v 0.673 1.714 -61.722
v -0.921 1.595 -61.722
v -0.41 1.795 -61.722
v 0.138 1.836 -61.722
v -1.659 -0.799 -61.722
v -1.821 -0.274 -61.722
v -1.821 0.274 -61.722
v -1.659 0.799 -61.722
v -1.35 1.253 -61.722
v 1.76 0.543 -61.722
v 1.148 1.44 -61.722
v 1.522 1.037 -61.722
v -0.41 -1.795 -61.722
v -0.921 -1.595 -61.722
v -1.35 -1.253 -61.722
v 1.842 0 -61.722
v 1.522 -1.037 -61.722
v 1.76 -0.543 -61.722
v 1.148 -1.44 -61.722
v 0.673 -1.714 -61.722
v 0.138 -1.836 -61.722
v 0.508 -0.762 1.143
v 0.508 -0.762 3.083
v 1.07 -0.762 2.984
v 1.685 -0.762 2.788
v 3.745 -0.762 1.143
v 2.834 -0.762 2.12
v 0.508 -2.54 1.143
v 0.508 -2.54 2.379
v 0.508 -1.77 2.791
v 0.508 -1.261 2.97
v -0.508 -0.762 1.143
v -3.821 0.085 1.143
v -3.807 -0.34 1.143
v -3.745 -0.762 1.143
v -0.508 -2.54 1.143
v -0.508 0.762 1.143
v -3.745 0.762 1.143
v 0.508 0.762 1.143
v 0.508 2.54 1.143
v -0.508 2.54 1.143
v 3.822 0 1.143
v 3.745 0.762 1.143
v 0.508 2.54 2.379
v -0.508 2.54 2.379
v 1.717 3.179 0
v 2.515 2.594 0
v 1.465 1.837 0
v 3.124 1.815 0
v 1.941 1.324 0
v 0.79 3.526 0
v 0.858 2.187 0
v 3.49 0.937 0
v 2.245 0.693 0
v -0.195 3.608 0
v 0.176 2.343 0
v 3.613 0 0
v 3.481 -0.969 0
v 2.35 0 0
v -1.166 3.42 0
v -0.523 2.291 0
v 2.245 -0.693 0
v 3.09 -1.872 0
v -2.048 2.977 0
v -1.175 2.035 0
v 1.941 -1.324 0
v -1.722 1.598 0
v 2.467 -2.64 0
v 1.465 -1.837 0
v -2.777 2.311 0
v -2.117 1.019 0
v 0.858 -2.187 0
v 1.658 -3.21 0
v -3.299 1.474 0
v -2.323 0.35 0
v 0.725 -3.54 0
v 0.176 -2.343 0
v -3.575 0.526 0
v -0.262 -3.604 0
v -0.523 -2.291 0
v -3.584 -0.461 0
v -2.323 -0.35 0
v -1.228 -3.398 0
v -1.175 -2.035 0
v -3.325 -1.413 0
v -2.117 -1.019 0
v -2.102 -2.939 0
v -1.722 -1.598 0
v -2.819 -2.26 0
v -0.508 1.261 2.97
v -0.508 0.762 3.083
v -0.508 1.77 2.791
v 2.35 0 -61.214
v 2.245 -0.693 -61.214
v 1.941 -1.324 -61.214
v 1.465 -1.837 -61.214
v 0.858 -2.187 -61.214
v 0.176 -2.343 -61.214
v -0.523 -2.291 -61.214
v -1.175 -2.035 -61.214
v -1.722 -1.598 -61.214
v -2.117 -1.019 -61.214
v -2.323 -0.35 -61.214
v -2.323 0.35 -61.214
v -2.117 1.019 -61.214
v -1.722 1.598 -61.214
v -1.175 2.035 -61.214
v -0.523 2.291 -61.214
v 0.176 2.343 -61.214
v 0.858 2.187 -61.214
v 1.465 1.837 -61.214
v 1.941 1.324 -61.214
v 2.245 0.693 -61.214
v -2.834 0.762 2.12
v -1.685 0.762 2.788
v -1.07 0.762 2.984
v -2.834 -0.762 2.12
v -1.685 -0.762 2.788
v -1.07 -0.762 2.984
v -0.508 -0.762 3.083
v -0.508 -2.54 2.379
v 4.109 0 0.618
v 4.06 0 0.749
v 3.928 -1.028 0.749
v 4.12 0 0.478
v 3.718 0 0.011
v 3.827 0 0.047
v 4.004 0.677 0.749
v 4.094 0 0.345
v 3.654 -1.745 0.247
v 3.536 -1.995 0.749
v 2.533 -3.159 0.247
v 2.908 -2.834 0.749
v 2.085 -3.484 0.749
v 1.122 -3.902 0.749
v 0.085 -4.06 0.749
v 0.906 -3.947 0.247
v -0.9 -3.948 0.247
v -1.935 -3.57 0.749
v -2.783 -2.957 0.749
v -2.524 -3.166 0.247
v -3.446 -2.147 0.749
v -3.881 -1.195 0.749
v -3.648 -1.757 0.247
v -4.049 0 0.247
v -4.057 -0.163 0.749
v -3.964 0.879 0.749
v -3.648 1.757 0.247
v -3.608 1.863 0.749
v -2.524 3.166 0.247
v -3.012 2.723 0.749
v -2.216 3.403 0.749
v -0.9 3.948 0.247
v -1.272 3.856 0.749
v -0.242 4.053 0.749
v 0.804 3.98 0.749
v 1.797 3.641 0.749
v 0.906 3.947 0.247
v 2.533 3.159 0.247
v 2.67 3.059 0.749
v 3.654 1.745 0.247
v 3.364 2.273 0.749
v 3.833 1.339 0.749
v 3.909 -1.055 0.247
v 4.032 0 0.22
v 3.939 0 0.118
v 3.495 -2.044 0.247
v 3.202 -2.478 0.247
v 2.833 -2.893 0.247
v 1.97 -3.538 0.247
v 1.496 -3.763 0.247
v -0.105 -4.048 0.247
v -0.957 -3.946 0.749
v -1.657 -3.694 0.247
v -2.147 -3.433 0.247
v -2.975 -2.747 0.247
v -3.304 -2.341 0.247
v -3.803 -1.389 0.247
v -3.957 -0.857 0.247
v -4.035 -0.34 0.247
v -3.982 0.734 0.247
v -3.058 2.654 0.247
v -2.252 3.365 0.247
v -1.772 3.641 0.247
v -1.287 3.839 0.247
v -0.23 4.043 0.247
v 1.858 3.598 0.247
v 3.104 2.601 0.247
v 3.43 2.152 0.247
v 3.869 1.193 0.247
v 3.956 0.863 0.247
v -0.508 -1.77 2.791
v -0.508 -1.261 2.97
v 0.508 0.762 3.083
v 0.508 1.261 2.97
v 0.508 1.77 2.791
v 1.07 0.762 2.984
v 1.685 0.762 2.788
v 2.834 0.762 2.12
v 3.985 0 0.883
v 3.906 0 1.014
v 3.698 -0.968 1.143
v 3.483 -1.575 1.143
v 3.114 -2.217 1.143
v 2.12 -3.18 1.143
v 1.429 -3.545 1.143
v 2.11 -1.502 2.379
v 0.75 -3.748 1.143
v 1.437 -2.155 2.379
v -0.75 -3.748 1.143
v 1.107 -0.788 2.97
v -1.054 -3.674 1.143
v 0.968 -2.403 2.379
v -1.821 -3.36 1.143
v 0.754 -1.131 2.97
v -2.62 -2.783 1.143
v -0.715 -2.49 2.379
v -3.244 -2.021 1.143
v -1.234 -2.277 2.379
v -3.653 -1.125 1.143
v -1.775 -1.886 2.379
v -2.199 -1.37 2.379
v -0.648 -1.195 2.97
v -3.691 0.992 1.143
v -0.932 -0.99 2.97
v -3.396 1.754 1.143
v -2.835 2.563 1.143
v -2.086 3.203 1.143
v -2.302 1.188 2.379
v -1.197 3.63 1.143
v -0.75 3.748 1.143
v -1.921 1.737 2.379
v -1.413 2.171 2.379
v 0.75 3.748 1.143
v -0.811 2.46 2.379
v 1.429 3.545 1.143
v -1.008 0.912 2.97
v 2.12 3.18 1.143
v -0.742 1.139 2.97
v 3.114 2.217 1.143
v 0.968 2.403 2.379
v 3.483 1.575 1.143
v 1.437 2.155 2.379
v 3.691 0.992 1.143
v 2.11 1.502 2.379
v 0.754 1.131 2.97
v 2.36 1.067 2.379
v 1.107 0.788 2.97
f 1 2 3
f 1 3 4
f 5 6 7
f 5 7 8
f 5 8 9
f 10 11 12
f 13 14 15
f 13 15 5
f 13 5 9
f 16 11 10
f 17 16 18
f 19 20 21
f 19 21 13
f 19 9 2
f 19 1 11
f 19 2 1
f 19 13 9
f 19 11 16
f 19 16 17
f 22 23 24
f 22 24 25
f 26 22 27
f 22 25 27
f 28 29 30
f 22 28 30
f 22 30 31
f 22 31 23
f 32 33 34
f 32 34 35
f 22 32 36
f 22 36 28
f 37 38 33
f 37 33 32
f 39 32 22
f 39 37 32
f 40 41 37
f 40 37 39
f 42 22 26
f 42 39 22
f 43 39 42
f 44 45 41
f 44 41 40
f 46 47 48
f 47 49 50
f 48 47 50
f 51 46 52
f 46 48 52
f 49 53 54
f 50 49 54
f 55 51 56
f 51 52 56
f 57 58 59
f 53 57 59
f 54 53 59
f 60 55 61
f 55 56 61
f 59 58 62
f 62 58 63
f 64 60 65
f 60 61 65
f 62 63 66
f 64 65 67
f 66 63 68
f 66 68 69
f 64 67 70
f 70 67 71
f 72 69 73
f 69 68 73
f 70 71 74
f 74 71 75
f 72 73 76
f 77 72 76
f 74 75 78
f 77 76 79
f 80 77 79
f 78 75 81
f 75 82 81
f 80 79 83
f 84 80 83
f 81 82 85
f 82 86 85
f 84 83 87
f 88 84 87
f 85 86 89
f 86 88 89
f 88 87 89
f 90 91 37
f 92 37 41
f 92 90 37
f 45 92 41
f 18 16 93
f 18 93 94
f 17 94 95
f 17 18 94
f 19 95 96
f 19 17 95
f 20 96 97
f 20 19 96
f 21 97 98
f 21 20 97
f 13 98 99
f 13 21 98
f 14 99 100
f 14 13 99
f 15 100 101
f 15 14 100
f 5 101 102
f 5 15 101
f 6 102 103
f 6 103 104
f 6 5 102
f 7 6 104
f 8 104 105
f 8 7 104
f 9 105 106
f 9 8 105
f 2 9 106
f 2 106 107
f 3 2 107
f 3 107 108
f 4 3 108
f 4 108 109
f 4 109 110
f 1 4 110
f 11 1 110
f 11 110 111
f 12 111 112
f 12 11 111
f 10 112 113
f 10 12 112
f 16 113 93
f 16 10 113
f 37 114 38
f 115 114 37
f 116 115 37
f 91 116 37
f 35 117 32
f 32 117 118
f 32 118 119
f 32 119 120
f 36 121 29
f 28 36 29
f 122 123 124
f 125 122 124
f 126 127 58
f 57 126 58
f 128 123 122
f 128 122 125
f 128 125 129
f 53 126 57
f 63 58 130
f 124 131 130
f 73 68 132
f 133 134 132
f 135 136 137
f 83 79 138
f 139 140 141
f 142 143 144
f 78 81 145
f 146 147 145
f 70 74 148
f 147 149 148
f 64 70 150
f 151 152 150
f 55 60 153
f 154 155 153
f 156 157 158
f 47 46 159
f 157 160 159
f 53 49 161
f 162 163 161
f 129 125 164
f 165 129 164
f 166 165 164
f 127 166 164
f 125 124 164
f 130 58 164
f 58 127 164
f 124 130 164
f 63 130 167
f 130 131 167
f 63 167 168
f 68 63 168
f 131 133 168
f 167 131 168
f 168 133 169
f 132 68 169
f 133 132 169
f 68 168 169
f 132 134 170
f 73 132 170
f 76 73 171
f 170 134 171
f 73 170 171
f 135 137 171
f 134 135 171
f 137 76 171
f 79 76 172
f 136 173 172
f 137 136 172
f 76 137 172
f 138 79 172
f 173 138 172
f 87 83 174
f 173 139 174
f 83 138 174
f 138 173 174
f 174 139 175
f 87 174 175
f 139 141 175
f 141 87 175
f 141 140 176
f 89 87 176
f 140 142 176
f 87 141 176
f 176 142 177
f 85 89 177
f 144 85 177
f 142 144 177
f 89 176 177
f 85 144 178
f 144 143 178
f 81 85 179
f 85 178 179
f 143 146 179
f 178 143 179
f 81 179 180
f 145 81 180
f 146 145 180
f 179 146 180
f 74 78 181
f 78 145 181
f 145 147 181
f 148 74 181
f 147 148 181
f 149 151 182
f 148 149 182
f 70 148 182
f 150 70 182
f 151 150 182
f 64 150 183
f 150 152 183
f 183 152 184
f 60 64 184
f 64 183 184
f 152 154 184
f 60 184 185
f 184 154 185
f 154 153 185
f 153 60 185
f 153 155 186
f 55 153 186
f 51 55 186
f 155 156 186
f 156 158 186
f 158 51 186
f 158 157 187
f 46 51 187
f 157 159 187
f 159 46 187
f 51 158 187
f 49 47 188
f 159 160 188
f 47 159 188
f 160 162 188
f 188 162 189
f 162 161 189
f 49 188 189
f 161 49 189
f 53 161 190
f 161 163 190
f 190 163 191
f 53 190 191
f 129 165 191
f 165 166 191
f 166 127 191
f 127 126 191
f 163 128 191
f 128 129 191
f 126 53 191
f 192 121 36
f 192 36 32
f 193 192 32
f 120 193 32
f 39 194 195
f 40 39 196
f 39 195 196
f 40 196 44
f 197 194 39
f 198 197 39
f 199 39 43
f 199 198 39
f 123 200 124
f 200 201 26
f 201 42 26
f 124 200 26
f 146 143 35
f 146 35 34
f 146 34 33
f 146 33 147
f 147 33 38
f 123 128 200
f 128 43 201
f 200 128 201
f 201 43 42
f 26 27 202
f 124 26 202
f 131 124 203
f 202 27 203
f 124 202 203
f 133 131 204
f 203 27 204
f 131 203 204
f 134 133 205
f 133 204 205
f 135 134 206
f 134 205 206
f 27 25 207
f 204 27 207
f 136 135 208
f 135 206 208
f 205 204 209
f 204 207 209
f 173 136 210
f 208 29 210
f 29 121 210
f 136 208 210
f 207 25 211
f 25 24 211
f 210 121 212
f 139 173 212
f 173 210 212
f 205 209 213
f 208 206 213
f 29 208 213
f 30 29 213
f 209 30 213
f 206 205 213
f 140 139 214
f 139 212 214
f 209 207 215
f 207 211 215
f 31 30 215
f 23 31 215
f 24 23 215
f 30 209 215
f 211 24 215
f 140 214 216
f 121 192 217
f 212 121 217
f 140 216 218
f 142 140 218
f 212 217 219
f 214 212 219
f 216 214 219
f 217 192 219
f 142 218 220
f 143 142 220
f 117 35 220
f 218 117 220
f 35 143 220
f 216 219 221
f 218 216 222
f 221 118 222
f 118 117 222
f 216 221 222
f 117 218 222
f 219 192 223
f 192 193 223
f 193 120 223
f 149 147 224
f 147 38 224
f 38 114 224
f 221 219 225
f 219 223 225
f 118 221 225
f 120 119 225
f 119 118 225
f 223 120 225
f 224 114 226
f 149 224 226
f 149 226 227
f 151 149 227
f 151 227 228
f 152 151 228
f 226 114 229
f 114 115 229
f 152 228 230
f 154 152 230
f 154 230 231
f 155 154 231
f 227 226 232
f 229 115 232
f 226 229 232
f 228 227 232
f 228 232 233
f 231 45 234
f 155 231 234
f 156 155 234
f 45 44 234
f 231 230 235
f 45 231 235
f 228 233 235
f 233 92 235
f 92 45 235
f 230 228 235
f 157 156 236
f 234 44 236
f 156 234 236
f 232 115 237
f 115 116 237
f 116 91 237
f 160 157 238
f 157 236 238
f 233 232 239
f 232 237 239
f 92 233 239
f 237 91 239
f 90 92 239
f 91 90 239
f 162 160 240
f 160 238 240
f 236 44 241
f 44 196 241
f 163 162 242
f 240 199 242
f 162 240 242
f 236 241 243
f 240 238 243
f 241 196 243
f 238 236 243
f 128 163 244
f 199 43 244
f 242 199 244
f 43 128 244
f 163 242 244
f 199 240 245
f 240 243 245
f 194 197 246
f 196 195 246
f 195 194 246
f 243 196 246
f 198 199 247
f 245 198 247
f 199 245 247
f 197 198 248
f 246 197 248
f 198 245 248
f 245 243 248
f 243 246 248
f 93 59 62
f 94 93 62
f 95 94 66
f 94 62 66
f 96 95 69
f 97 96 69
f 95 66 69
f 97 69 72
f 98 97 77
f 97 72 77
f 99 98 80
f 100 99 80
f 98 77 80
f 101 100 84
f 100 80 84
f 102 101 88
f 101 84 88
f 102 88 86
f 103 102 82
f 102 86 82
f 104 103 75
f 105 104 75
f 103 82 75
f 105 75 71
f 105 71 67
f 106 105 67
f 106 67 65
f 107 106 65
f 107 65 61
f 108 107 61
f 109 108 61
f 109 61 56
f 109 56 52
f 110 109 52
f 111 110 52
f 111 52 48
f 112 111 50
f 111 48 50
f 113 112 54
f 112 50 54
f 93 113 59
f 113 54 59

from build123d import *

# Parameters (mm, degrees)
F2_R     = 0.508
F4_W     = 8.763
F4_H     = 1.524
F5_DEPTH = 2.032
F6_W     = 1.016
F6_H     = 5.08
F7_DEPTH = 2.032
F8_R     = 2.3495
F9_DEPTH = 61.722
F10_SIZE = 0.508


with BuildPart() as f1:
    # F0 (on Front) → F1 (revolve)
    with BuildSketch(Plane.XZ):
        with BuildLine():
            ThreePointArc((4.3815, 0), (2.705465, 2.297807), (0, 3.175))
            Line((0, 3.175), (0, 0))
            Line((0, 0), (4.3815, 0))
        make_face()
    revolve(axis=Axis((0, 0, 1.5875), (0, 0, -1)))

    # F2
    f2_edges = [f1.edges().sort_by_distance(p)[0] for p in [
        (-4.3815, 0, 0),
    ]]
    fillet(f2_edges, radius=F2_R)

    # F4 (on plane+point) → F5 (cut)
    with BuildSketch(Plane.XY.offset(3.175)):
        Rectangle(F4_W, F4_H)
    extrude(amount=-F5_DEPTH, mode=Mode.SUBTRACT)

    # F6 (on plane+point) → F7 (cut, through all)
    with BuildSketch(Plane.XY.offset(3.175)):
        Rectangle(F6_W, F6_H)
    extrude(amount=-F7_DEPTH, mode=Mode.SUBTRACT)

    # F8 (on face) → F9 (join)
    with BuildSketch(Plane(origin=(0, 0, 0), x_dir=(1, 0, 0), z_dir=(0, 0, -1))):
        Circle(F8_R)
    extrude(amount=F9_DEPTH)

    # F10
    f10_edges = [f1.edges().sort_by_distance(p)[0] for p in [
        (-2.3495, 0, -61.722),
    ]]
    chamfer(f10_edges, length=F10_SIZE)


solid = f1.part
